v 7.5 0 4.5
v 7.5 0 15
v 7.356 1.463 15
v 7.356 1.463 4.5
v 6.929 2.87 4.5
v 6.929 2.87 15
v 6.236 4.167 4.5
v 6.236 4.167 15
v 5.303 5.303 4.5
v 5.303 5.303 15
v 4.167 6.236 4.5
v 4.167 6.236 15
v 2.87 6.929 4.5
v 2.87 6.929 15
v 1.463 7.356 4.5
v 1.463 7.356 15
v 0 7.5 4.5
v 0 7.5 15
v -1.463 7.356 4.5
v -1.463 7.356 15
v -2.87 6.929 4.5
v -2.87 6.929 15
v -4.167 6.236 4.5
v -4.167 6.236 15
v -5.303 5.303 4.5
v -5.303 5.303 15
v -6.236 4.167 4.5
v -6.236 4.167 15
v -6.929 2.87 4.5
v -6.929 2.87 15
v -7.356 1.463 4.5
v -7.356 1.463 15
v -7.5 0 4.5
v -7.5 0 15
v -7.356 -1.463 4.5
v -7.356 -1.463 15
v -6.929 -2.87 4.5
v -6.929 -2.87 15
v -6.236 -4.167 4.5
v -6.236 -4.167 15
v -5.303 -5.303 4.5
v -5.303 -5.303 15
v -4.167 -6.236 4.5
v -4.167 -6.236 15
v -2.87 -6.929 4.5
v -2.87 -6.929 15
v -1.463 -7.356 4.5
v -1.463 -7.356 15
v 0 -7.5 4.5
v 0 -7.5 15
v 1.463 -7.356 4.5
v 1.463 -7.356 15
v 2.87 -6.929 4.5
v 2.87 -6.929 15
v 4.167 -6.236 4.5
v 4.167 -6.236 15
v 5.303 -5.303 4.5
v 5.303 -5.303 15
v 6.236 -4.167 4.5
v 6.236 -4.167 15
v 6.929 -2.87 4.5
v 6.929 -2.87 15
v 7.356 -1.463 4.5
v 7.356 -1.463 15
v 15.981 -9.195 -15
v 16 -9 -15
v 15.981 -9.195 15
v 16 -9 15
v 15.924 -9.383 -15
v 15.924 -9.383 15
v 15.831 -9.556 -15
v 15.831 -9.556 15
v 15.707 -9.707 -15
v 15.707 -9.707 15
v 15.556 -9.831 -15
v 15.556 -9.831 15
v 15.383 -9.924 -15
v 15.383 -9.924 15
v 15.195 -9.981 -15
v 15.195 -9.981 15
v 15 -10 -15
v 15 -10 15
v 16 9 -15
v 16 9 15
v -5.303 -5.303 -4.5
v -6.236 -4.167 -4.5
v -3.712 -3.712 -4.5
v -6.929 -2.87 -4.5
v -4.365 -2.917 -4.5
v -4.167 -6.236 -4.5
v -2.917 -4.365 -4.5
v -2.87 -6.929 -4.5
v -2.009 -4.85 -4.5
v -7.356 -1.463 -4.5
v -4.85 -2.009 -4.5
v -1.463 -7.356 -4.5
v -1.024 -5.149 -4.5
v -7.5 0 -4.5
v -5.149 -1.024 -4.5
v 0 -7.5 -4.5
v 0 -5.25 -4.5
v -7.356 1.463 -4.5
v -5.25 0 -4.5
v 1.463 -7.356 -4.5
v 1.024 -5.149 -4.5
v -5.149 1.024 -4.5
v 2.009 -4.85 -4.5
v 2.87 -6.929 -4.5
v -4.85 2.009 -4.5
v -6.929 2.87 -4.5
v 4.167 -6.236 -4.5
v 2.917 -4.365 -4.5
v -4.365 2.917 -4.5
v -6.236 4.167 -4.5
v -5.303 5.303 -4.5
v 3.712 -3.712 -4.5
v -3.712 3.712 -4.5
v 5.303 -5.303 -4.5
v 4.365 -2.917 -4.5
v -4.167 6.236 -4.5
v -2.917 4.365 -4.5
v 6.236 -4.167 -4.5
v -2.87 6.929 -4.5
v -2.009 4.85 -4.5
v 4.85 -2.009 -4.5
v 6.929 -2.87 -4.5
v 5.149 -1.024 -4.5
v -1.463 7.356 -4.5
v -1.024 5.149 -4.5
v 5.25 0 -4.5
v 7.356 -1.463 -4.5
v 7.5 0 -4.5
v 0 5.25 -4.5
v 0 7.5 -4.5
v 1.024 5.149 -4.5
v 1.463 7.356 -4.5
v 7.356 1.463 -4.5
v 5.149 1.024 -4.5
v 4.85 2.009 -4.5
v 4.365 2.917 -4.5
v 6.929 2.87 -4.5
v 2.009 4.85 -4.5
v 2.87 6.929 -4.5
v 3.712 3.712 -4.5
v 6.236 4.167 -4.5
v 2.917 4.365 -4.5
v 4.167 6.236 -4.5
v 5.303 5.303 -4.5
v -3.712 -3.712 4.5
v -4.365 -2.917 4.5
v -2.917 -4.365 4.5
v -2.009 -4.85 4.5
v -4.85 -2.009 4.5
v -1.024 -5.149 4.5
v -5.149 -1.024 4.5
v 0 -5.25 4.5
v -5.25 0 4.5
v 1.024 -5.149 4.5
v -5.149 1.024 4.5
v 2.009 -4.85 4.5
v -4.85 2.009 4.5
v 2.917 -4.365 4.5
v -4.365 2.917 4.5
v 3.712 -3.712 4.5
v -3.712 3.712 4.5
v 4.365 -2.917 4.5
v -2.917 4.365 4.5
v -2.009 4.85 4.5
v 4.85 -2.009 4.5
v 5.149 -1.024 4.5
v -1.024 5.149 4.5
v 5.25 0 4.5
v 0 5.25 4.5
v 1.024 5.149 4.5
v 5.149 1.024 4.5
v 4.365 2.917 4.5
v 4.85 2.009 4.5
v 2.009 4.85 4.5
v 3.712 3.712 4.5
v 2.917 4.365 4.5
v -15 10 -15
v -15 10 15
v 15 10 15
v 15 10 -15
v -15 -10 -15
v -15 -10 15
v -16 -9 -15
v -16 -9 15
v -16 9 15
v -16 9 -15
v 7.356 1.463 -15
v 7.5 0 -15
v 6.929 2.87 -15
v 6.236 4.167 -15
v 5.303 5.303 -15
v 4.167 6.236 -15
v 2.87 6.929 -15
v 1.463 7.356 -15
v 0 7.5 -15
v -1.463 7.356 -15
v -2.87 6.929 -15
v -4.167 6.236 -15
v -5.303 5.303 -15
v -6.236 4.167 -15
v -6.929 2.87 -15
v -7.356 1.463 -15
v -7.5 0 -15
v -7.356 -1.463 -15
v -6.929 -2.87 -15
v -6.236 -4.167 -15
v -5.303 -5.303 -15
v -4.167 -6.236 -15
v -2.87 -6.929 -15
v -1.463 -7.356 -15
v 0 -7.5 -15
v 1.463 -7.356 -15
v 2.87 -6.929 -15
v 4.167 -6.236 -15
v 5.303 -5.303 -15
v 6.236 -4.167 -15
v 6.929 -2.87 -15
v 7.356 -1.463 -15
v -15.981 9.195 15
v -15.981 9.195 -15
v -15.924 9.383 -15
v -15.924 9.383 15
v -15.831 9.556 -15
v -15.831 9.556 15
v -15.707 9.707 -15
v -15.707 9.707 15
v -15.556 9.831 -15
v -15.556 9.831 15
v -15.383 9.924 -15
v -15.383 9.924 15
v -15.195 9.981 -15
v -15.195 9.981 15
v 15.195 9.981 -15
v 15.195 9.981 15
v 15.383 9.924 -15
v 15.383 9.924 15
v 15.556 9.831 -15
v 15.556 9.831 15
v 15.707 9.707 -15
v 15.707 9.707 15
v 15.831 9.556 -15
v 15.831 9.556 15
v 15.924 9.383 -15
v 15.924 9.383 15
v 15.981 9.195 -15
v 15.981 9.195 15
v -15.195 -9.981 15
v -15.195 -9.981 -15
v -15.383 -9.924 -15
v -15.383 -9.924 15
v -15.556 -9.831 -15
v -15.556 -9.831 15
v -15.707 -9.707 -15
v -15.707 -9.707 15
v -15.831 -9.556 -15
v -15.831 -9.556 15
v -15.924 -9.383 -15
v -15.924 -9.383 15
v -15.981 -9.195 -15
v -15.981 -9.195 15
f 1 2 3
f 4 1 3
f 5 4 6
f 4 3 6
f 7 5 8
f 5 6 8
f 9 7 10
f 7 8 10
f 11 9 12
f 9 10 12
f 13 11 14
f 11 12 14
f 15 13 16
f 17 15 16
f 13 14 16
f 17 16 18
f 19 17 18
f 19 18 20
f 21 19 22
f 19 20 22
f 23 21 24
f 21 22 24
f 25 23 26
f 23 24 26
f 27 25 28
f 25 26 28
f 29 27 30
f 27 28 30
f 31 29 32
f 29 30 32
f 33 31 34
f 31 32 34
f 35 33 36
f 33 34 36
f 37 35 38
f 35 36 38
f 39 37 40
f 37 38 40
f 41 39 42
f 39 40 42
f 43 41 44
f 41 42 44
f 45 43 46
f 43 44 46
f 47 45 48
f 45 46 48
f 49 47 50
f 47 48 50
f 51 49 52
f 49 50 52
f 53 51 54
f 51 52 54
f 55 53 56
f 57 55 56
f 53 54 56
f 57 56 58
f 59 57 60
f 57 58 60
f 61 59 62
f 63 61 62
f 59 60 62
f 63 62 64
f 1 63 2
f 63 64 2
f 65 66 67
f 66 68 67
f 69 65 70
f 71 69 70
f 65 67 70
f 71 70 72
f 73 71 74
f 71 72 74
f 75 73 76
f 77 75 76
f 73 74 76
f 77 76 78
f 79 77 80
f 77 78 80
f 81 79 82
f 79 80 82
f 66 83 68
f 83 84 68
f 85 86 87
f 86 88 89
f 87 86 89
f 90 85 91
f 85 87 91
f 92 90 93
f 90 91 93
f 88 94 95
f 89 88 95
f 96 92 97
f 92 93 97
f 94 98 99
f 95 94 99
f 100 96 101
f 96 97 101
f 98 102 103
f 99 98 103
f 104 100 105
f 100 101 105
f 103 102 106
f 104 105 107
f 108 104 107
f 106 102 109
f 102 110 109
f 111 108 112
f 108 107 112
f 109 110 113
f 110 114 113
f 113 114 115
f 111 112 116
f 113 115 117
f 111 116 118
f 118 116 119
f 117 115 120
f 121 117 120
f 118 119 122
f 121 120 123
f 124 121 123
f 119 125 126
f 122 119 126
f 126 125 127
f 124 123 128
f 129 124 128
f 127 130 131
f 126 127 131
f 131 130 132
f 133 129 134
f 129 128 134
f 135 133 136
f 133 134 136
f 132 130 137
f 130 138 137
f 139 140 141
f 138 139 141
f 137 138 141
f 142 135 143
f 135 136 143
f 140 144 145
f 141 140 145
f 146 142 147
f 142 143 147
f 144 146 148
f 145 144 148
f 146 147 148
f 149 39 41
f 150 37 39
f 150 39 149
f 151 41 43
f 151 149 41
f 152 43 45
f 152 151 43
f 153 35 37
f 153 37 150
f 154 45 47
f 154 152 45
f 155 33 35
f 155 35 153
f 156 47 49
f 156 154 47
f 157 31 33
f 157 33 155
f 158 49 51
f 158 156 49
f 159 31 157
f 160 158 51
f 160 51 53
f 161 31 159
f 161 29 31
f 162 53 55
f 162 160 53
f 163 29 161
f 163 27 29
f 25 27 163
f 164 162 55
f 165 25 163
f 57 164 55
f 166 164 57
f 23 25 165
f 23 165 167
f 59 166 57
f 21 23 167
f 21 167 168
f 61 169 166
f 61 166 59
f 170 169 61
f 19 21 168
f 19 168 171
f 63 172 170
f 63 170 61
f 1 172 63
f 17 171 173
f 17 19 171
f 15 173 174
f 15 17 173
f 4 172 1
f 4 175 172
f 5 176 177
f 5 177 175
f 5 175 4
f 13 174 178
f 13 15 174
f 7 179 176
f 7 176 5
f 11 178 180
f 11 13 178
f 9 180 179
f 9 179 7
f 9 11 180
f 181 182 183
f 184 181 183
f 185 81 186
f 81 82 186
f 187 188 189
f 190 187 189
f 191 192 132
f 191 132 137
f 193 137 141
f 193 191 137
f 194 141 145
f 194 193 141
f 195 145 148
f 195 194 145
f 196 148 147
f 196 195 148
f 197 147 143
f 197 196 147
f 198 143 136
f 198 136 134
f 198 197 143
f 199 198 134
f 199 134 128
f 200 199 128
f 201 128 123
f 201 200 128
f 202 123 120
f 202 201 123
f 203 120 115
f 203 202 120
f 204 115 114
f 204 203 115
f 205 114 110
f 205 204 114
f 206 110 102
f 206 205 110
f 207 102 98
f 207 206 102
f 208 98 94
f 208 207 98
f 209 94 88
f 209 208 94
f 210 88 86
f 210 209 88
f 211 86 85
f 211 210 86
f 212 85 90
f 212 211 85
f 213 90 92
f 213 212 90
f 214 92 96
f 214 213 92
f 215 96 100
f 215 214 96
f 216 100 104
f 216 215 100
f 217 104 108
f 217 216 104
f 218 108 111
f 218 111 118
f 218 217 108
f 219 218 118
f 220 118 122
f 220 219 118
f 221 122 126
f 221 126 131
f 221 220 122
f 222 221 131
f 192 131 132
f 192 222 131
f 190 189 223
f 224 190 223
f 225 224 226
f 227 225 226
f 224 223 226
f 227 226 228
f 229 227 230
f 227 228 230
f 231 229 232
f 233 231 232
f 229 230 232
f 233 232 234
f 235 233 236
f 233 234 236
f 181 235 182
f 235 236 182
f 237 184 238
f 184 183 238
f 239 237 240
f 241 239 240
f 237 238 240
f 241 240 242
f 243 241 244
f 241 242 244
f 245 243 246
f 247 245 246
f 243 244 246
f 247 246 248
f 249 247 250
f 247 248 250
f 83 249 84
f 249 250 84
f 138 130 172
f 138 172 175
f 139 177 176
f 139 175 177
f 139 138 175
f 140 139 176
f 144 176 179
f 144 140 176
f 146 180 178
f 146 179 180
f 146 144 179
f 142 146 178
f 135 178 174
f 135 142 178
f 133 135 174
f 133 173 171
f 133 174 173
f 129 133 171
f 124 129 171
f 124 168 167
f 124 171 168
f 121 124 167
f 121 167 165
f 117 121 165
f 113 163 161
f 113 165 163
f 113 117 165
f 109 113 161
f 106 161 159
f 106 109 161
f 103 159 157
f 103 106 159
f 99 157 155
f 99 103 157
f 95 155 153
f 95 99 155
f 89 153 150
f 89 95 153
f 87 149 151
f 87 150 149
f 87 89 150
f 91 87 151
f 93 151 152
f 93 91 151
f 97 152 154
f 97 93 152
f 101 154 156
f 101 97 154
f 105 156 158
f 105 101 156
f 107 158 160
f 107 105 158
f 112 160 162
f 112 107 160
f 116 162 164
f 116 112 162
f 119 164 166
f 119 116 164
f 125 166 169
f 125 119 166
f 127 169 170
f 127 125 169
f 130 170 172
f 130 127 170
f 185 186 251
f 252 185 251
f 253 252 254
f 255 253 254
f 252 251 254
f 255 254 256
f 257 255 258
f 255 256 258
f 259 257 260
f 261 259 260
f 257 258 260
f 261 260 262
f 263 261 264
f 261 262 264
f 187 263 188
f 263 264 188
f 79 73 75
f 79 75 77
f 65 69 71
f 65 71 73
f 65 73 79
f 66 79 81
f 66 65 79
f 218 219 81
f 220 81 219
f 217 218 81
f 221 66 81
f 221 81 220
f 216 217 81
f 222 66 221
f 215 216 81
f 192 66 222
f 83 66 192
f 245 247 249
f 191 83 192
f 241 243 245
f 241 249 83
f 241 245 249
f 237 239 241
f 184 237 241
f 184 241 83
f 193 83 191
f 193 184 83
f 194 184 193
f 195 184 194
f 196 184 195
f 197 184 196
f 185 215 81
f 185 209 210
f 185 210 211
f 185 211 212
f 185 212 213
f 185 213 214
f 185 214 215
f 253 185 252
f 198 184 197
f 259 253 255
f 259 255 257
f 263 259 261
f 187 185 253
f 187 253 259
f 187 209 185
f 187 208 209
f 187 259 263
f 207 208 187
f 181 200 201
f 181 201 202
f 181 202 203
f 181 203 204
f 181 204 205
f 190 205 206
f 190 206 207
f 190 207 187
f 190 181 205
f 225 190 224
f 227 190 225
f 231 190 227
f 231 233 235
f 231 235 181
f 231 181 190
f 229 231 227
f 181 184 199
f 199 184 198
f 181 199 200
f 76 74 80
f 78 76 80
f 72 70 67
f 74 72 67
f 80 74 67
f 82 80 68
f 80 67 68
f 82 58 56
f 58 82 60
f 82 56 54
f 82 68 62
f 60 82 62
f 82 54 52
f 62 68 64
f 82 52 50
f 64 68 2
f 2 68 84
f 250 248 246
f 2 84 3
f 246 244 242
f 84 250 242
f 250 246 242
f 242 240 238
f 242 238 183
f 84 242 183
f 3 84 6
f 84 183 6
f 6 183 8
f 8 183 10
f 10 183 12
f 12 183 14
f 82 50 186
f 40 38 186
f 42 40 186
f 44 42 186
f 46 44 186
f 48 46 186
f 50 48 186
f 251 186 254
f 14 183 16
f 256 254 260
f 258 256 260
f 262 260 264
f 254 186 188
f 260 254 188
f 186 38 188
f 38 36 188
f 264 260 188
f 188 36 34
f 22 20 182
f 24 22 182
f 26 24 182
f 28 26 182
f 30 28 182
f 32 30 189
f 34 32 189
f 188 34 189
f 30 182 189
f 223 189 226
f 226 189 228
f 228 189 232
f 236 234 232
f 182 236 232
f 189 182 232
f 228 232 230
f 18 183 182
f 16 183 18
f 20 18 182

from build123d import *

# Parameters (mm, degrees)
SKETCH1_R           = 5.25
BOSS_EXTRUDE1_DEPTH = 15
SKETCH2_R           = 7.5
CUT_EXTRUDE1_DEPTH  = 10.5


with BuildPart() as part:
    # Sketch1 → Boss-Extrude1 (new, symmetric)
    with BuildSketch(Plane.XY):
        with BuildLine():
            Line((-15, 10), (15, 10))
            ThreePointArc((15, 10), (15.707106781, 9.707106781), (16, 9))
            Line((16, 9), (16, -9))
            ThreePointArc((16, -9), (15.707106781, -9.707106781), (15, -10))
            Line((15, -10), (-15, -10))
            ThreePointArc((-15, -10), (-15.707106781, -9.707106781), (-16, -9))
            Line((-16, -9), (-16, 9))
            ThreePointArc((-16, 9), (-15.707106781, 9.707106781), (-15, 10))
        make_face()
        Circle(SKETCH1_R, mode=Mode.SUBTRACT)
    extrude(amount=BOSS_EXTRUDE1_DEPTH, both=True)

    # Sketch2 → Cut-Extrude1 (cut)
    with BuildSketch(Plane.XY.offset(15)):
        Circle(SKETCH2_R)
    cut_extrude1 = extrude(amount=-CUT_EXTRUDE1_DEPTH, mode=Mode.SUBTRACT)

    # Mirror1: Cut-Extrude1 across plane
    add(cut_extrude1.mirror(Plane.XY), mode=Mode.SUBTRACT)


solid = part.part
